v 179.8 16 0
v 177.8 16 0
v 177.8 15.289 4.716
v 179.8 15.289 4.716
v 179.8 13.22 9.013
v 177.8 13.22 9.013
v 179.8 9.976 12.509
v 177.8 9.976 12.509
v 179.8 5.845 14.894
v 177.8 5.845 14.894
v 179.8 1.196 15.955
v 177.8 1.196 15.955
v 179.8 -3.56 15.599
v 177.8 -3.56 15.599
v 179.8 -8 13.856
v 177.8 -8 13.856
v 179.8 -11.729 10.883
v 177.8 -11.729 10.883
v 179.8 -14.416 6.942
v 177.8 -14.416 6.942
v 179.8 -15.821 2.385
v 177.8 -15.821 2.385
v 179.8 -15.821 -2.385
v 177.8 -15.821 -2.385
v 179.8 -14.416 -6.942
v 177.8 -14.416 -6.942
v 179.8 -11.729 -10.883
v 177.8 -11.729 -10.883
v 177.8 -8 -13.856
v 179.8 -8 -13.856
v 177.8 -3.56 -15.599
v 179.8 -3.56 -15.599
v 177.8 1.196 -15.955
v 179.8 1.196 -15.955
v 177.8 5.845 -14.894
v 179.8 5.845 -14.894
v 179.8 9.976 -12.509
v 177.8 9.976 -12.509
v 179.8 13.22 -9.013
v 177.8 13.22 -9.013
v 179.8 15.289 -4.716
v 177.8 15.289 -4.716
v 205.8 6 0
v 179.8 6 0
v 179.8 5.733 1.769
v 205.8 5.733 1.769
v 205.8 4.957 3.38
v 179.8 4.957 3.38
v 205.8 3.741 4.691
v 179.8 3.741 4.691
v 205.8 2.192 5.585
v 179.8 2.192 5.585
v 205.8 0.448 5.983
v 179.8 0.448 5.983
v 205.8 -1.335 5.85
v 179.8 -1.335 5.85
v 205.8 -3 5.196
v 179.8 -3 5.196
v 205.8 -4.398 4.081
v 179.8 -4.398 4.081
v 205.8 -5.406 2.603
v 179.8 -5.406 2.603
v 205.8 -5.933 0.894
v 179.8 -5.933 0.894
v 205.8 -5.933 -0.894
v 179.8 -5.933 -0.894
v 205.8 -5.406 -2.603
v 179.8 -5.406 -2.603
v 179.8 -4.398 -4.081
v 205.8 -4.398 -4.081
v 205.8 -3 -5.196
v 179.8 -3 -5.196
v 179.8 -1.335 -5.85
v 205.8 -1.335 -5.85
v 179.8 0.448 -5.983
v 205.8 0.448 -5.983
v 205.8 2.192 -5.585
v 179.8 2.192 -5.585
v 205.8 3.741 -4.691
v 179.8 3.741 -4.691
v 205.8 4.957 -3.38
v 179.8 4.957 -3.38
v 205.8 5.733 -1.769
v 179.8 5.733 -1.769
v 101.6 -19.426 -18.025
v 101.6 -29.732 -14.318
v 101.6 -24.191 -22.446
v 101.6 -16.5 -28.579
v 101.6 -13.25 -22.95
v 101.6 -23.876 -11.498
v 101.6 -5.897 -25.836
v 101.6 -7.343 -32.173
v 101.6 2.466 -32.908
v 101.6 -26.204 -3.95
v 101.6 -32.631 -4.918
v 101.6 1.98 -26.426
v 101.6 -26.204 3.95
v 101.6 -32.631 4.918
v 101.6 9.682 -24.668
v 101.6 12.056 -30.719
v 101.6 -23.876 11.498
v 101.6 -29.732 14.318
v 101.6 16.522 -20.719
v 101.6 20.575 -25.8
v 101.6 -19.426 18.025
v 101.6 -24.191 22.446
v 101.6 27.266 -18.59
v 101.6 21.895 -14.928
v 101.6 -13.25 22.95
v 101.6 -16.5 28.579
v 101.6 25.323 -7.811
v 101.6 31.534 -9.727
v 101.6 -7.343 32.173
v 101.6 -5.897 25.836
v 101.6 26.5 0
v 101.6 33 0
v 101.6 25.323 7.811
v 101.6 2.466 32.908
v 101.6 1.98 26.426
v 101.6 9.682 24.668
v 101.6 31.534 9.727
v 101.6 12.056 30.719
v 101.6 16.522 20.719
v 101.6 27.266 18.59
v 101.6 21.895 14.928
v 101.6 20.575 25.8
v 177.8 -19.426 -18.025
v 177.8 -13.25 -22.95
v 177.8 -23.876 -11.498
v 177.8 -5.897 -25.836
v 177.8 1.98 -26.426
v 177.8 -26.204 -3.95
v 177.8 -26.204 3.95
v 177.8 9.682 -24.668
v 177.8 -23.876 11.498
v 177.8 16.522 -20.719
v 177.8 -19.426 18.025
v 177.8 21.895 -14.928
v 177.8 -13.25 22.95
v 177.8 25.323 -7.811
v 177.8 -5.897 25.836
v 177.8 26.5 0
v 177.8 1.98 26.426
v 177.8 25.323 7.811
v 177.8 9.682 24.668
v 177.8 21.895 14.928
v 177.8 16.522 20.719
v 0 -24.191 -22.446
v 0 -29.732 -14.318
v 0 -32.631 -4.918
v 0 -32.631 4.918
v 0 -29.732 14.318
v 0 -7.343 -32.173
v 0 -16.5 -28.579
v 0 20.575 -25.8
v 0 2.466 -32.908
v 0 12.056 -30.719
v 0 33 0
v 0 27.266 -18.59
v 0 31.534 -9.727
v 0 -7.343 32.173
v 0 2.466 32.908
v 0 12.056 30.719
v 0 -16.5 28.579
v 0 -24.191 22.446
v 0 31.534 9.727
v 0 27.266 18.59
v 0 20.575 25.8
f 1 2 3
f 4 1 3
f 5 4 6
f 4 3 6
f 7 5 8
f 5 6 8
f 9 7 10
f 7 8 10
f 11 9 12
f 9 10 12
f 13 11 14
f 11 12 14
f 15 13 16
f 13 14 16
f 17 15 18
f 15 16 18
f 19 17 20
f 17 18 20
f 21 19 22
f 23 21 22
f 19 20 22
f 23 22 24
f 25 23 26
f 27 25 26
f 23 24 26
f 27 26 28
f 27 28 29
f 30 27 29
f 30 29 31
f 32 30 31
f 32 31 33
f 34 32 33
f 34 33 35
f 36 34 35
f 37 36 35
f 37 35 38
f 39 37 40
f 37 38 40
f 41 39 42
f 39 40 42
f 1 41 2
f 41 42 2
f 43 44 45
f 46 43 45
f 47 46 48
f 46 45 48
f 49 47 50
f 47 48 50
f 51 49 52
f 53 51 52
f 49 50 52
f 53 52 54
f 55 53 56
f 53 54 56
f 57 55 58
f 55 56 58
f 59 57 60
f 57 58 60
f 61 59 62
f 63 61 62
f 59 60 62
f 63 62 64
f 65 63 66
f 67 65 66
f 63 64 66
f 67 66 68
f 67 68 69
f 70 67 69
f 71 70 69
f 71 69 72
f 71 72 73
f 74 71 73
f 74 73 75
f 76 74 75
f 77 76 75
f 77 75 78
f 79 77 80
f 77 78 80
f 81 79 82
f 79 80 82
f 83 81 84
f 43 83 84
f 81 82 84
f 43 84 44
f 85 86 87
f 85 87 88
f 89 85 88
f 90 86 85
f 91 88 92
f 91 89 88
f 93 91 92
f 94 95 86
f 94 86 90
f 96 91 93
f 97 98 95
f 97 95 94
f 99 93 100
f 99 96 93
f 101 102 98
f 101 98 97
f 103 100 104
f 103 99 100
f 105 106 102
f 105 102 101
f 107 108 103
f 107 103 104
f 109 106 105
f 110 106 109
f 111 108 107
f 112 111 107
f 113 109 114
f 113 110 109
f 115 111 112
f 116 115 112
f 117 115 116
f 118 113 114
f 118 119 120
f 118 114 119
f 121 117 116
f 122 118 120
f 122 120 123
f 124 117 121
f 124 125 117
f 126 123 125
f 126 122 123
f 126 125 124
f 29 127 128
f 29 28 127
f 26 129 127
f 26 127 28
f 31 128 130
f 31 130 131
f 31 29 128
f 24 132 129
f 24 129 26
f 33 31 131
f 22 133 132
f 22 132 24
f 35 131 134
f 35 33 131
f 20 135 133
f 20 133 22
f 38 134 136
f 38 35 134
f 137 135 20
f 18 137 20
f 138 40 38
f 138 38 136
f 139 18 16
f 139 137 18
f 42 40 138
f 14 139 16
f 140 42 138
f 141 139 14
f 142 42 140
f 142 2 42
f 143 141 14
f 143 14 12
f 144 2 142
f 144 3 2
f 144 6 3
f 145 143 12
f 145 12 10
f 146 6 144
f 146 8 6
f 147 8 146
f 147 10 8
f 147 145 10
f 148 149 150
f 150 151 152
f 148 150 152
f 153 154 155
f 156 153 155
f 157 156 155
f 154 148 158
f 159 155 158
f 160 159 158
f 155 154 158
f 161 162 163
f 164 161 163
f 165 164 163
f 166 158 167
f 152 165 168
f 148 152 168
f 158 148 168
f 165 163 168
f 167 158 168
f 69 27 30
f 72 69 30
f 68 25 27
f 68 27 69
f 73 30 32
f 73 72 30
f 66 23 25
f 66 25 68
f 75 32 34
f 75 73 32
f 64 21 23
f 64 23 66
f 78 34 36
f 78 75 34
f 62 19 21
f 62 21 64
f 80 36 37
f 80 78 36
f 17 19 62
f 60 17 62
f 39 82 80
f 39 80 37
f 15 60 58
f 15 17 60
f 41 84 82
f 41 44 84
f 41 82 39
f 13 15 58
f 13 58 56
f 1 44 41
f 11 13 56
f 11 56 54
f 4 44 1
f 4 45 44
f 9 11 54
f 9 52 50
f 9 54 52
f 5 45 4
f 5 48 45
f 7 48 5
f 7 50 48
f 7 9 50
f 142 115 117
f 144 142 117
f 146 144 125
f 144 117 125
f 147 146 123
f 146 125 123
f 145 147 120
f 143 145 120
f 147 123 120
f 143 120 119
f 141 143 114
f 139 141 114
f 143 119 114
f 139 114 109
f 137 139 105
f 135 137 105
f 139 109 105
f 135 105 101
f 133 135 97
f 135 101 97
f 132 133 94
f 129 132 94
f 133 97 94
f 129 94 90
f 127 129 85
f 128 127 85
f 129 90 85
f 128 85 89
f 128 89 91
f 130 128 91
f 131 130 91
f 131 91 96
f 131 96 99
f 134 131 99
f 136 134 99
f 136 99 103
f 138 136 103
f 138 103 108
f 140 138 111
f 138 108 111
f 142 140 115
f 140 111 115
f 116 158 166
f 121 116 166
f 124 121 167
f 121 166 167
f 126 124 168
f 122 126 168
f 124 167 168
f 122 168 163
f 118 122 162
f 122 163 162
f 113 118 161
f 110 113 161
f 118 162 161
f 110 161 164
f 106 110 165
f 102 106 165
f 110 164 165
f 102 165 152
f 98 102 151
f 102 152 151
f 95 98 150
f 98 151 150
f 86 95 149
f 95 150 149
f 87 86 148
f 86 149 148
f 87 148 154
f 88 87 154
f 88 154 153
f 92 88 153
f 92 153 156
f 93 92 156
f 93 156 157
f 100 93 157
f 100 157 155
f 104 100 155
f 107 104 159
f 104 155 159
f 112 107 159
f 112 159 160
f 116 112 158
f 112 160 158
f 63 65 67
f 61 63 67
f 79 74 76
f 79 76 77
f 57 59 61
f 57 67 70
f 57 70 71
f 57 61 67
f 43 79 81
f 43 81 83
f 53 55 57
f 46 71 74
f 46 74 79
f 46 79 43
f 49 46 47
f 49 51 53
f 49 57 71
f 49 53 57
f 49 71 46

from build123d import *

# Parameters (mm, degrees)
F0_R     = 33
F1_DEPTH = 101.6
F2_R     = 26.5
F3_DEPTH = 76.2
F4_R     = 16
F5_DEPTH = 2
F6_R     = 6
F7_DEPTH = 26


with BuildPart() as f1:
    # F0 (on Right) → F1 (new body)
    with BuildSketch(Plane.YZ):
        Circle(F0_R)
    extrude(amount=F1_DEPTH)

    # F2 (on face) → F3 (join)
    with BuildSketch(Plane.YZ.offset(101.6)):
        Circle(F2_R)
    extrude(amount=F3_DEPTH)

    # F4 (on face) → F5 (join)
    with BuildSketch(Plane.YZ.offset(177.8)):
        Circle(F4_R)
    extrude(amount=F5_DEPTH)

    # F6 (on face) → F7 (join)
    with BuildSketch(Plane.YZ.offset(179.8)):
        Circle(F6_R)
    extrude(amount=F7_DEPTH)


solid = f1.part
